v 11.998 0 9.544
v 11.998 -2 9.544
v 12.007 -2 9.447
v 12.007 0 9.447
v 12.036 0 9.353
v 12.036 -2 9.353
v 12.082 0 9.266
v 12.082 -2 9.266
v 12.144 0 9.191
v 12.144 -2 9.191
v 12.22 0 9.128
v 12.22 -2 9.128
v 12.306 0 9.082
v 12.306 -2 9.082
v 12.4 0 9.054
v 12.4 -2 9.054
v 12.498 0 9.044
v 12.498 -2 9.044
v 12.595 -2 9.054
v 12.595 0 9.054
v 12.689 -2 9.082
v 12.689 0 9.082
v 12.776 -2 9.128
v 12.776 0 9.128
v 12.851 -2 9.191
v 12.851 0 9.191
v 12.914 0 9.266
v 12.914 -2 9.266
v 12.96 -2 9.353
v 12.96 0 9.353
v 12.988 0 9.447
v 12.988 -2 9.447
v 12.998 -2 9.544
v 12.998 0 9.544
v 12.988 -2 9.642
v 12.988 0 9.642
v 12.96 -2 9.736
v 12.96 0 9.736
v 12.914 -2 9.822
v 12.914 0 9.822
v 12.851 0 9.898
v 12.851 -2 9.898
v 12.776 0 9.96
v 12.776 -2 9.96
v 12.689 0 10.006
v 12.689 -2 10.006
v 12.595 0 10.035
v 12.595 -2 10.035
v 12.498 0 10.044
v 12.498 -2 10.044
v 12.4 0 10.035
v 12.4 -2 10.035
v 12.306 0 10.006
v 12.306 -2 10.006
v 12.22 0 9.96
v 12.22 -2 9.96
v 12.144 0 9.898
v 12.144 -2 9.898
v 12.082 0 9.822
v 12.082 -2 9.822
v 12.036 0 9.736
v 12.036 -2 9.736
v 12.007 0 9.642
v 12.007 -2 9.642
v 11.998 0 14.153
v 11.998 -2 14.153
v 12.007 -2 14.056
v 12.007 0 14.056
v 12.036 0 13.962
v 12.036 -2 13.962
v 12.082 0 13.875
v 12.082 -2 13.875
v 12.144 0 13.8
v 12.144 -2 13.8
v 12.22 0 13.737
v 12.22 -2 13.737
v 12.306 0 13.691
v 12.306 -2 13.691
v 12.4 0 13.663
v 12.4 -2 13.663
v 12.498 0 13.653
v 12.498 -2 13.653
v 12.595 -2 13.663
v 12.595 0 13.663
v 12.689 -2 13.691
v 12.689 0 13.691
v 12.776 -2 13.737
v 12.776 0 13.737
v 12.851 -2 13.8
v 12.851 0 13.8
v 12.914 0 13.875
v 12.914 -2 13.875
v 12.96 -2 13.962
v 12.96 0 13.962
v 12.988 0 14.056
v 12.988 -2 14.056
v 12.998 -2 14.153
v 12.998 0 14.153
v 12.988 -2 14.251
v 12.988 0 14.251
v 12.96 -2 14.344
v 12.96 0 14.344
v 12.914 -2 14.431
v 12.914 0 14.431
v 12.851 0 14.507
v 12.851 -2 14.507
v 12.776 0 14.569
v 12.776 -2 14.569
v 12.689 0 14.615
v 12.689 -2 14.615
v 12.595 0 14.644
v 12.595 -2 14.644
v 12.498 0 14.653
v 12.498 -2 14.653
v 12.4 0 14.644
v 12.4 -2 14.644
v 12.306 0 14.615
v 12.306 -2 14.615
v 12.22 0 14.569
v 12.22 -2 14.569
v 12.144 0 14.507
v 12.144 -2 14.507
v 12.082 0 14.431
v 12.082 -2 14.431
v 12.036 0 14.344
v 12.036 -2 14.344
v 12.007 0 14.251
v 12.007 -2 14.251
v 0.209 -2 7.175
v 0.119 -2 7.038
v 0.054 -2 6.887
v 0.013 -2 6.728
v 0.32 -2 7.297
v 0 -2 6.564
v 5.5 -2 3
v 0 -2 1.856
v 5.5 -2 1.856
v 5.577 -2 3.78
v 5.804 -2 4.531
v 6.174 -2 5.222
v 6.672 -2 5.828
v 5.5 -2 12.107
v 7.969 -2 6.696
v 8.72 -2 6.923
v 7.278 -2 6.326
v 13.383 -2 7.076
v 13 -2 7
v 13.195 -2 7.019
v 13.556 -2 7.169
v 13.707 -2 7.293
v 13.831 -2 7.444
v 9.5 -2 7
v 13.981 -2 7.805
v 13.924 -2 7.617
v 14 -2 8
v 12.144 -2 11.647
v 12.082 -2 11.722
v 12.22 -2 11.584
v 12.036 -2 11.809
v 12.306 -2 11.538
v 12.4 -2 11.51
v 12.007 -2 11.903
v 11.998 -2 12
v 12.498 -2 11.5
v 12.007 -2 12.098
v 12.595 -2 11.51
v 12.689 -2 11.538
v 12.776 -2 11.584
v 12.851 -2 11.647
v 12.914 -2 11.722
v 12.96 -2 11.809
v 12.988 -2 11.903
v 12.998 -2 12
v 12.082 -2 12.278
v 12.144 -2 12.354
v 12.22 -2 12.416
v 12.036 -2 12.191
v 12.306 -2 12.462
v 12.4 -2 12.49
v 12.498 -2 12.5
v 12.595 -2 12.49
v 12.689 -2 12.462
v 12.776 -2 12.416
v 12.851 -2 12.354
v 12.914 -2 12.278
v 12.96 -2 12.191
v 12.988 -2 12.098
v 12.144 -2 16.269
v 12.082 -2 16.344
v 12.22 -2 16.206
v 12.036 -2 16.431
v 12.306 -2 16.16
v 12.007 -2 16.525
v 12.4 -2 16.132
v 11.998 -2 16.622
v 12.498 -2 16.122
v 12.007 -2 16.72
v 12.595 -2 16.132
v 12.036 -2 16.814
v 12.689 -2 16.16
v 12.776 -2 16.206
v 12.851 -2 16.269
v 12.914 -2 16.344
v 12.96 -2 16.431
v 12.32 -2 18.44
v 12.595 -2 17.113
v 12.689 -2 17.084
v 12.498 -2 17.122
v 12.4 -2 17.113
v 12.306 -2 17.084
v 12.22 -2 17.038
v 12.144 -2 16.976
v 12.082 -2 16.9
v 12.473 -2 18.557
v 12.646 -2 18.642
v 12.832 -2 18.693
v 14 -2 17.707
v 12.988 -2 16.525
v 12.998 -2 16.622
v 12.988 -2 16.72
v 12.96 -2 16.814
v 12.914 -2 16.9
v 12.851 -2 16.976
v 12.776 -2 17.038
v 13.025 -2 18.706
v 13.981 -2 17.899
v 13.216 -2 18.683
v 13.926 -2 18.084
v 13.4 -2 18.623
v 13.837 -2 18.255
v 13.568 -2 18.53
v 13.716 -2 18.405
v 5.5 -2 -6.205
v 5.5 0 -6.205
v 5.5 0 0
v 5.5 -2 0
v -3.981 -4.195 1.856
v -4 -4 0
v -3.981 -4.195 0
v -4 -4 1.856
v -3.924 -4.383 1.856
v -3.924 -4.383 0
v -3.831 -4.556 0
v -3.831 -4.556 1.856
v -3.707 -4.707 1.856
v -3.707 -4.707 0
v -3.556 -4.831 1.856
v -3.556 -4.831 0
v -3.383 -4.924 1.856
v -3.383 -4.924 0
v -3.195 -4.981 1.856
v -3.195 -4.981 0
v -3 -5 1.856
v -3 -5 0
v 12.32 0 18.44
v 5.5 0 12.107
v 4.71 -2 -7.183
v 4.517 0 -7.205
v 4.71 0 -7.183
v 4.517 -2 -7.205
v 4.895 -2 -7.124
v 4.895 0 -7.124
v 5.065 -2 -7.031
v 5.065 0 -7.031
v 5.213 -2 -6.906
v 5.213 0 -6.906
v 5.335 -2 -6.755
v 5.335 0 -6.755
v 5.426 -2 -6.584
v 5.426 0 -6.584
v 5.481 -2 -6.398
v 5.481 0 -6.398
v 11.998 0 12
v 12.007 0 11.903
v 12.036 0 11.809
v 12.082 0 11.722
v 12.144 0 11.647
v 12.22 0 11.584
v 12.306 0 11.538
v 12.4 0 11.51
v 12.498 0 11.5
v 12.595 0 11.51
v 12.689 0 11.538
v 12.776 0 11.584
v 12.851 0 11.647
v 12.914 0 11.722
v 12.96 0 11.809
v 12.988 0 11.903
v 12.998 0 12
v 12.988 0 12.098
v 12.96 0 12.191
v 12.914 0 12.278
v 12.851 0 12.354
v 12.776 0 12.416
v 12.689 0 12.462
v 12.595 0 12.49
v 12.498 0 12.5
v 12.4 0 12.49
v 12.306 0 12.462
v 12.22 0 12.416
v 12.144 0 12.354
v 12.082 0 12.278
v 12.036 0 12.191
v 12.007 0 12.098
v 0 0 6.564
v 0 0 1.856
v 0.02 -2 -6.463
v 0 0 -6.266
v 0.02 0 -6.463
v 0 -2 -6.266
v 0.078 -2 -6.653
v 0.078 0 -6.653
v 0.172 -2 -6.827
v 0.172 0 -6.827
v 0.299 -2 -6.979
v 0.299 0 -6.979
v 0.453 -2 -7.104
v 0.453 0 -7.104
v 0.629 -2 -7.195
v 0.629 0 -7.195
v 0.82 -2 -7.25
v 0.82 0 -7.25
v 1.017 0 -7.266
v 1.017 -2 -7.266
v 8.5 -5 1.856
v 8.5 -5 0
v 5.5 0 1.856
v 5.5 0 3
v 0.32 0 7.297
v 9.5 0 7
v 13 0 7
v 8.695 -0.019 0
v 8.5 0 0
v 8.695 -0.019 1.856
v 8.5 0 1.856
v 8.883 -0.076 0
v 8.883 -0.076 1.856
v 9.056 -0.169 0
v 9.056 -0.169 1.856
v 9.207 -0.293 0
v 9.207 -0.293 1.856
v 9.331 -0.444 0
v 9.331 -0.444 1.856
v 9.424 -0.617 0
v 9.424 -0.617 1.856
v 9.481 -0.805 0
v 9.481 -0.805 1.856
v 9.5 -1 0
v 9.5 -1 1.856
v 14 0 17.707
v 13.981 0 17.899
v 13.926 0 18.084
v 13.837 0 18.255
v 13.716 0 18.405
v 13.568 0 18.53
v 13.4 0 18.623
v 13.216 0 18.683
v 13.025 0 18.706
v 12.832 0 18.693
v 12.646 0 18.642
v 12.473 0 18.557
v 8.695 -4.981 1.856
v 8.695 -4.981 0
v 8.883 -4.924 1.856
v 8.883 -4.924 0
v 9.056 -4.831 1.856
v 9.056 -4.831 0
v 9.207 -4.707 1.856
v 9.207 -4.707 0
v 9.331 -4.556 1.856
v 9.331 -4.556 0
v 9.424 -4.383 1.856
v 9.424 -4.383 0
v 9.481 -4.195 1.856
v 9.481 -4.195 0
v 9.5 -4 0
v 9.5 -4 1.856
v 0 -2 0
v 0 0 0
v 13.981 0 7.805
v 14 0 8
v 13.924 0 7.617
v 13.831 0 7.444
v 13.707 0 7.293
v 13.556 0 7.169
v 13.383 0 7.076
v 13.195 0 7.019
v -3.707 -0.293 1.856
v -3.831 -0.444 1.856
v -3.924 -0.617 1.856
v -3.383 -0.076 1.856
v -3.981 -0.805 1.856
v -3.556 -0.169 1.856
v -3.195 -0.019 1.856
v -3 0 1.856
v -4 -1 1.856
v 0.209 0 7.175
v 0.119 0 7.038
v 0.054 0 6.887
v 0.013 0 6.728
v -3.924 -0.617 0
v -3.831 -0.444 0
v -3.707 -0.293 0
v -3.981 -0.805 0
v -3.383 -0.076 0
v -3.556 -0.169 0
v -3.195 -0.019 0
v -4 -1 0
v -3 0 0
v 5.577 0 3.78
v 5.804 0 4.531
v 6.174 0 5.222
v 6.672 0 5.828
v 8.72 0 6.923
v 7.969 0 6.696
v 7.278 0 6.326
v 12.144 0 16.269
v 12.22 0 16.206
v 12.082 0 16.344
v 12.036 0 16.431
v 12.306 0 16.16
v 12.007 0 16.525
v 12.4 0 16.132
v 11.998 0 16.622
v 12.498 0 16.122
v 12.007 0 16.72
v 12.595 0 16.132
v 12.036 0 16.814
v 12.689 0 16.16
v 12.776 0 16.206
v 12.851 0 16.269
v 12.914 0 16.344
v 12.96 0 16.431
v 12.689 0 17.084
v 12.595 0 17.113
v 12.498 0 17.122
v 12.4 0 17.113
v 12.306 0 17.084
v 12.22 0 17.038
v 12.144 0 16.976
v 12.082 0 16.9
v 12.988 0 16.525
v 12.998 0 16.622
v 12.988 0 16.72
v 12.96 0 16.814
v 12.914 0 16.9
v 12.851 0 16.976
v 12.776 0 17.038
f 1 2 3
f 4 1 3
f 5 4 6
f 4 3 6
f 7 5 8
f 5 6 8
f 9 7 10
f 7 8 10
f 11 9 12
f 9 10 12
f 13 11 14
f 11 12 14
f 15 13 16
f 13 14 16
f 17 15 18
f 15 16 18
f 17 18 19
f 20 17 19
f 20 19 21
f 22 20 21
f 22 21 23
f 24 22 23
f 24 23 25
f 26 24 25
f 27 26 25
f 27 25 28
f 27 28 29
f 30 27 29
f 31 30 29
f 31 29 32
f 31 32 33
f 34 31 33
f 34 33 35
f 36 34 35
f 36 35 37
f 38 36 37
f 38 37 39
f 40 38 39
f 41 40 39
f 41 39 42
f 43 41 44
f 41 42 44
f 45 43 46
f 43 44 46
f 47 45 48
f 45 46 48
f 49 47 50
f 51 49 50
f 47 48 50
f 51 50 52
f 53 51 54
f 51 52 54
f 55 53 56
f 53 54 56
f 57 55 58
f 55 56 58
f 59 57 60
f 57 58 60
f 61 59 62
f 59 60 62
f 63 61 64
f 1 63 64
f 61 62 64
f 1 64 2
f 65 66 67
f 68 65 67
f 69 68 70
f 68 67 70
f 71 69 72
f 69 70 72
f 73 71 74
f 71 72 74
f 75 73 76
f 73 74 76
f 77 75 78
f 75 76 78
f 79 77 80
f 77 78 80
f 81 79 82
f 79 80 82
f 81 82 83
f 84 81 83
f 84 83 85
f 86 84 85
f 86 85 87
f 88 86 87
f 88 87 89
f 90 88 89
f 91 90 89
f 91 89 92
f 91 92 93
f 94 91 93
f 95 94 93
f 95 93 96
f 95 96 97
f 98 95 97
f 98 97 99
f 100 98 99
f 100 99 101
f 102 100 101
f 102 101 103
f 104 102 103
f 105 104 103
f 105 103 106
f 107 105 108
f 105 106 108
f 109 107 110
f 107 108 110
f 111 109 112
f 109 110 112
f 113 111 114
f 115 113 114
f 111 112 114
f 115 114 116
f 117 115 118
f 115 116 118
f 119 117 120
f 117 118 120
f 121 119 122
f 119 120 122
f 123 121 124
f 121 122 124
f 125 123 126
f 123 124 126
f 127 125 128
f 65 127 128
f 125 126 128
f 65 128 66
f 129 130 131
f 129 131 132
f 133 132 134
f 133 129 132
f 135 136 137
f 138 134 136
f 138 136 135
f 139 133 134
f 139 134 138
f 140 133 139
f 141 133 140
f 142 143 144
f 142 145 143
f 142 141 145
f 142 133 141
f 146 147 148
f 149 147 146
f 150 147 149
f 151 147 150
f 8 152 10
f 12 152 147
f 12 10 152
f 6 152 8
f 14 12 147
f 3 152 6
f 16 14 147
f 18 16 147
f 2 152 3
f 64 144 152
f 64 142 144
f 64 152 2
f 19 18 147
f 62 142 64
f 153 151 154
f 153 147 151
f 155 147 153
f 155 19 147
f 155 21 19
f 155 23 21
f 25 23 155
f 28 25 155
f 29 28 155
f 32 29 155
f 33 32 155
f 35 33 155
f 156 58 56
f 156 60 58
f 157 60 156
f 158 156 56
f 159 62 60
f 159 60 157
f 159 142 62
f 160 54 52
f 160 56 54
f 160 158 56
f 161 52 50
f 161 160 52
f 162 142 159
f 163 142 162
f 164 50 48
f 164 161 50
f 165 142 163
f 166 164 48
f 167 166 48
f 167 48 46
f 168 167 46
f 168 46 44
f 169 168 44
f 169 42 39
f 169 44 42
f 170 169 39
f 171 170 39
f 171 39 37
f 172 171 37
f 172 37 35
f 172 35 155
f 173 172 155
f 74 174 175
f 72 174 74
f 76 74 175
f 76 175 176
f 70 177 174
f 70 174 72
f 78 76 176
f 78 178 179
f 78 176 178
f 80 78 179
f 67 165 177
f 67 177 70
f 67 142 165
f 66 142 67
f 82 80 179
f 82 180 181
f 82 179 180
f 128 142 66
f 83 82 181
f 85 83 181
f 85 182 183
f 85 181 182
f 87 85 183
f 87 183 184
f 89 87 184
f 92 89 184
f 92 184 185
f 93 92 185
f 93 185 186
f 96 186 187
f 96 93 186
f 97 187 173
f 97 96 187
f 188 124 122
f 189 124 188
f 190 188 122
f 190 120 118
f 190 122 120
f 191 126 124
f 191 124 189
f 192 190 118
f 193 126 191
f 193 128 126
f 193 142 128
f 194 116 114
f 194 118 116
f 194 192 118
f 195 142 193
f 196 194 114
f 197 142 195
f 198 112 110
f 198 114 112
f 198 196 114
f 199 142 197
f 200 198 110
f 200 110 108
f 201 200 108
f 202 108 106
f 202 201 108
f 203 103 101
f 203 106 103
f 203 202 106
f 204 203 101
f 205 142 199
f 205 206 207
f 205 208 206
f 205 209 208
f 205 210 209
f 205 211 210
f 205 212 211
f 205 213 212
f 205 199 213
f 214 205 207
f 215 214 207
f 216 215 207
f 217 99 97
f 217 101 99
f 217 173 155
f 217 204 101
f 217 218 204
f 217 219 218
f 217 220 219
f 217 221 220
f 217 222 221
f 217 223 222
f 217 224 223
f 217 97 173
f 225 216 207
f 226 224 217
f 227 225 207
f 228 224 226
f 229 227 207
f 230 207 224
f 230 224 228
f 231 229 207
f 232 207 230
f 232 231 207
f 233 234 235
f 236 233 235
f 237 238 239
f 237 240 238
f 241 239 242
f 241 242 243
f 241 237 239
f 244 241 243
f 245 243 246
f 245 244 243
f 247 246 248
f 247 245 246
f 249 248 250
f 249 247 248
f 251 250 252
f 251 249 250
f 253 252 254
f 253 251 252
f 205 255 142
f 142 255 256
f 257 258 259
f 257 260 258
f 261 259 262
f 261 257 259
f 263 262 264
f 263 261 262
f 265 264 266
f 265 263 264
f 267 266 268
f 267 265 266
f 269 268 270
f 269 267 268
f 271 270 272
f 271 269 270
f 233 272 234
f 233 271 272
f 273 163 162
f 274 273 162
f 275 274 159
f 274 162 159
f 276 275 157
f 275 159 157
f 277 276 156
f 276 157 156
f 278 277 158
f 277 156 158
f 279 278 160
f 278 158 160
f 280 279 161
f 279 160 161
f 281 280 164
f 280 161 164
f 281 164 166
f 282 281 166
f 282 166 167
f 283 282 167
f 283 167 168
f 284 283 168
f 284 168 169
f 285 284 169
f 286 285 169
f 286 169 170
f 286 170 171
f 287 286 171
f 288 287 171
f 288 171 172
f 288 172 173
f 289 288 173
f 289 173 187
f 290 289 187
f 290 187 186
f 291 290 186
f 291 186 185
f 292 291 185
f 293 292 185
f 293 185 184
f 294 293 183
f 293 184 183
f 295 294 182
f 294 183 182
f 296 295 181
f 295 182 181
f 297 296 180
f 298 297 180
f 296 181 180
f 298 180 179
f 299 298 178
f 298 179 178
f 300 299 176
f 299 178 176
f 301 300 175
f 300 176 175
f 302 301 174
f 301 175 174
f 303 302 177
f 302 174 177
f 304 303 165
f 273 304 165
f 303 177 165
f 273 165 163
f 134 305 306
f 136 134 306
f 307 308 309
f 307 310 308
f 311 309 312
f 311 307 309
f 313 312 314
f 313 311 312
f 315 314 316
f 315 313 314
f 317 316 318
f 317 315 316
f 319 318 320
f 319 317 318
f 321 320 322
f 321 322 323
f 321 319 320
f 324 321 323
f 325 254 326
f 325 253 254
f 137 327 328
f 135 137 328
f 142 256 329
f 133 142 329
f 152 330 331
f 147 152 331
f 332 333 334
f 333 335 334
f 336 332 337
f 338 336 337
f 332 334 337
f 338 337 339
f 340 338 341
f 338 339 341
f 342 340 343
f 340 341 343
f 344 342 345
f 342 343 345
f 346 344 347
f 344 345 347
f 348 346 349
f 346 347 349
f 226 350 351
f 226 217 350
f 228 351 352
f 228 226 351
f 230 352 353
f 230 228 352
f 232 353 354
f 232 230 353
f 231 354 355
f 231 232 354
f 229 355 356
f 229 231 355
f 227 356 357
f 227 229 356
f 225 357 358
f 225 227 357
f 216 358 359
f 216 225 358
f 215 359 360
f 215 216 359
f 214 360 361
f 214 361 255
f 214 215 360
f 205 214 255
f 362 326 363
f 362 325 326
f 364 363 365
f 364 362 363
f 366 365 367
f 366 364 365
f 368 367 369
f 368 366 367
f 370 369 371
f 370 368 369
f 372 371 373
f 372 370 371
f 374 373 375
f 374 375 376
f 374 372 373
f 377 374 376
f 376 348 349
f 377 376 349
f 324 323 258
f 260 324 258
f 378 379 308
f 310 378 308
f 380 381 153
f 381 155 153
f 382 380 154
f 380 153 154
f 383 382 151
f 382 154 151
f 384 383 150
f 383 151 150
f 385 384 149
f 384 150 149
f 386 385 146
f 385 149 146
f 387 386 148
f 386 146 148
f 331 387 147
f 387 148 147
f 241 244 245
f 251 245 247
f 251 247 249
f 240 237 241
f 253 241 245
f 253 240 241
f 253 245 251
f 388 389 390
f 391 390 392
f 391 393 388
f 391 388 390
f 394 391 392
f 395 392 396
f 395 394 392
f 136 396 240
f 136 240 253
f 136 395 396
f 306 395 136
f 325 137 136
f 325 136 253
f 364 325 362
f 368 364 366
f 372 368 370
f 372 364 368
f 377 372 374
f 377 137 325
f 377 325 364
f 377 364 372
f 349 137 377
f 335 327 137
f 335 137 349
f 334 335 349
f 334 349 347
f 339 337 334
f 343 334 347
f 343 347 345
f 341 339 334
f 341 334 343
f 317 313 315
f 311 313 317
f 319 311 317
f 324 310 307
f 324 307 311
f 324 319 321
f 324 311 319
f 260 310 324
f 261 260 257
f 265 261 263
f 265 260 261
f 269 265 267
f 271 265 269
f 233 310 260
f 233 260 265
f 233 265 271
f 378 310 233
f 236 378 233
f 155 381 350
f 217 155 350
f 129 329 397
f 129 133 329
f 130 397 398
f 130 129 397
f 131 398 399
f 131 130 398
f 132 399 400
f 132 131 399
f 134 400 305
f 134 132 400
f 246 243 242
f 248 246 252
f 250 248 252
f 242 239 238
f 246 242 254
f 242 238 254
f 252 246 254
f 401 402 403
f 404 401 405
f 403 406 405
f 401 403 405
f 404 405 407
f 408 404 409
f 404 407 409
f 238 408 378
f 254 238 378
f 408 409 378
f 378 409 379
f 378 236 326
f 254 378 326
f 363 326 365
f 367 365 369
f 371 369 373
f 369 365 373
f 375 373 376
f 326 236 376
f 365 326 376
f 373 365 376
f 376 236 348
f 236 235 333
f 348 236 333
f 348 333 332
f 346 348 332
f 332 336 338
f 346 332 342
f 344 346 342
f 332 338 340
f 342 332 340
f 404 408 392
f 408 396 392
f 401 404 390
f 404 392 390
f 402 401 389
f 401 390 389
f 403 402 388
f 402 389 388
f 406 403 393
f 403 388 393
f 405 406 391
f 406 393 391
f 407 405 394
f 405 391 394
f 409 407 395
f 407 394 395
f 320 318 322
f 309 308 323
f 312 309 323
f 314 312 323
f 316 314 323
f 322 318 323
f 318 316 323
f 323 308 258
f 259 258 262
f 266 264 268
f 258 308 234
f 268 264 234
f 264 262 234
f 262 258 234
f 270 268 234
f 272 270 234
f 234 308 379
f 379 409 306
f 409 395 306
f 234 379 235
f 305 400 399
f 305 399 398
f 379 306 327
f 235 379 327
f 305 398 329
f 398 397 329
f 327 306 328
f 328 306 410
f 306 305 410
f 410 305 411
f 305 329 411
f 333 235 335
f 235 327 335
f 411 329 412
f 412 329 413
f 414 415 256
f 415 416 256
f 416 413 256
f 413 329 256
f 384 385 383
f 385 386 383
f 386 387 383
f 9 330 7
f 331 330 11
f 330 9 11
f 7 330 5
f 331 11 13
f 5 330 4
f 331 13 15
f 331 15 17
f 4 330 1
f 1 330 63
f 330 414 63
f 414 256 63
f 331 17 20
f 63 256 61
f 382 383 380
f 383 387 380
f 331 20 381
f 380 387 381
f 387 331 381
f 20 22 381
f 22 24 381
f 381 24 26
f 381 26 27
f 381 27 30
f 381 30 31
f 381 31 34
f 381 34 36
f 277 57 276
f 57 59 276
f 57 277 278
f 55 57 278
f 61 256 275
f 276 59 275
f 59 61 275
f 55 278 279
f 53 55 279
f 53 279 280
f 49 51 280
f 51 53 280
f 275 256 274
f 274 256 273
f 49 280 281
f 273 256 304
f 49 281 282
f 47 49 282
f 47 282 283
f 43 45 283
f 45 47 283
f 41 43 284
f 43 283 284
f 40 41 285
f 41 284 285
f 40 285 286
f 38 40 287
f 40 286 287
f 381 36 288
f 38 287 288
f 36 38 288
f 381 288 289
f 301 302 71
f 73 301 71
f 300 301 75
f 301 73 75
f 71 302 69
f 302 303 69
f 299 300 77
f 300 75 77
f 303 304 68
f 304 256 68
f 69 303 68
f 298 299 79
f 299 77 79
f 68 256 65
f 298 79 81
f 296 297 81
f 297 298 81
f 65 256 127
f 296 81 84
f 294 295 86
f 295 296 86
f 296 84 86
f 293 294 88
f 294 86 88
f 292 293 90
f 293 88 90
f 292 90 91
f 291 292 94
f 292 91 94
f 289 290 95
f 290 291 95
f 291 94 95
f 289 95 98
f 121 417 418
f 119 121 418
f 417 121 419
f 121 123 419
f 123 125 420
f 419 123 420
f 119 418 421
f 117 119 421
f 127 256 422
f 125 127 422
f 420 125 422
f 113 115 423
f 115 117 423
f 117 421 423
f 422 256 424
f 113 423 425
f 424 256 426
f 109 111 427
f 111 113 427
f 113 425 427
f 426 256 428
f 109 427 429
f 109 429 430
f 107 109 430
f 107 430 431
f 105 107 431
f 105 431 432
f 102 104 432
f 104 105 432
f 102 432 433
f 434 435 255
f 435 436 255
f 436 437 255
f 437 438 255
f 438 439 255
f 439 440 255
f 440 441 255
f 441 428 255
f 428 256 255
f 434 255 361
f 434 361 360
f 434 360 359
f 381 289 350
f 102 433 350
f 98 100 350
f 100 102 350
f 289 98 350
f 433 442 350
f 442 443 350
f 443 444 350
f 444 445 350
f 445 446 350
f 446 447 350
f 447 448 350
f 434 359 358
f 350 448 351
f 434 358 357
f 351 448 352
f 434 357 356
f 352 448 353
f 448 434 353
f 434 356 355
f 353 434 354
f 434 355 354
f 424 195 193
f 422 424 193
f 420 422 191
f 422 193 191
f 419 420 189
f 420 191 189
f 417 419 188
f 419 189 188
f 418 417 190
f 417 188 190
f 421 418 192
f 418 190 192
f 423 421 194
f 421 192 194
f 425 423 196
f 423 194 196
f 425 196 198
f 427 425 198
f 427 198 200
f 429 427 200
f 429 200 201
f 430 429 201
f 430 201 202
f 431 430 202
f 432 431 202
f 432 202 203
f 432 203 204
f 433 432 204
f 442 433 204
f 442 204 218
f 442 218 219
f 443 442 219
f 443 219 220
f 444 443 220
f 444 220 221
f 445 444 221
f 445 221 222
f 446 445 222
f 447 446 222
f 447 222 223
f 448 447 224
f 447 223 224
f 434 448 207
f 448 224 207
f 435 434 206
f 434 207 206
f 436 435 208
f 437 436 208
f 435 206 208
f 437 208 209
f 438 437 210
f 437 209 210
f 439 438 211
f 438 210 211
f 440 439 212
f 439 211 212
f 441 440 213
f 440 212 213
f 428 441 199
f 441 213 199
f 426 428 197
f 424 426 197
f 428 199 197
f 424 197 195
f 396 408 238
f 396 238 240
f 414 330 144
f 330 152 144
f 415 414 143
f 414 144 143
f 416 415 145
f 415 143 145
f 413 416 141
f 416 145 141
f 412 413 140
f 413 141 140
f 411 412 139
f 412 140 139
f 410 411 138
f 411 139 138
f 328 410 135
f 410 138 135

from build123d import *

# Parameters (mm, degrees)
F1_DEPTH = 2
F2_R     = 1
F3_R     = 4
F4_W     = 13.5
F4_H     = 1.8558323957
F5_DEPTH = 5
F6_R     = 1
F7_D     = 1


with BuildPart() as f1:
    # F0 (on Front) → F1 (new body)
    with BuildSketch(Plane.XZ):
        Polygon((5.5, 12.1071428571), (5.5, 7), (14, 7), (14, 20), align=None)
        Polygon((5.5, 12.1071428571), (0, 7), (5.5, 7), align=None)
        Polygon((5.5, 7), (0, 7), (0, -7.2836415662), (5.5, -7.188023068), align=None)
    extrude(amount=F1_DEPTH)

    # F2
    f2_edges = [f1.edges().sort_by_distance(p)[0] for p in [
        (0, -1, 7),
        (14, -1, 20),
        (14, -1, 7),
        (0, -1, -7.283642),
        (5.5, -1, -7.188023),
    ]]
    fillet(f2_edges, radius=F2_R)

    # F3
    f3_edges = [f1.edges().sort_by_distance(p)[0] for p in [
        (5.5, -1, 7),
    ]]
    fillet(f3_edges, radius=F3_R)

    # F4 (on Front) → F5 (join)
    with BuildSketch(Plane.XZ):
        with Locations((2.75, 0.9279161978)):
            Rectangle(F4_W, F4_H)
    extrude(amount=F5_DEPTH)

    # F6
    f6_edges = [f1.edges().sort_by_distance(p)[0] for p in [
        (9.5, -5, 0.927916),
        (-4, -5, 0.927916),
        (-4, 0, 0.927916),
        (9.5, 0, 0.927916),
    ]]
    fillet(f6_edges, radius=F6_R)

    # F7 (through all)
    with Locations(Plane(origin=(0, 0, 0), x_dir=(1, 0, 0), z_dir=(0, 1, 0))):
        with Locations((12.4978395179, -16.6222192347), (12.4978395179, -14.1531368718), (12.4978395179, -12.0000707684), (12.4978395179, -9.5441835001)):
            Hole(F7_D / 2)


solid = f1.part
